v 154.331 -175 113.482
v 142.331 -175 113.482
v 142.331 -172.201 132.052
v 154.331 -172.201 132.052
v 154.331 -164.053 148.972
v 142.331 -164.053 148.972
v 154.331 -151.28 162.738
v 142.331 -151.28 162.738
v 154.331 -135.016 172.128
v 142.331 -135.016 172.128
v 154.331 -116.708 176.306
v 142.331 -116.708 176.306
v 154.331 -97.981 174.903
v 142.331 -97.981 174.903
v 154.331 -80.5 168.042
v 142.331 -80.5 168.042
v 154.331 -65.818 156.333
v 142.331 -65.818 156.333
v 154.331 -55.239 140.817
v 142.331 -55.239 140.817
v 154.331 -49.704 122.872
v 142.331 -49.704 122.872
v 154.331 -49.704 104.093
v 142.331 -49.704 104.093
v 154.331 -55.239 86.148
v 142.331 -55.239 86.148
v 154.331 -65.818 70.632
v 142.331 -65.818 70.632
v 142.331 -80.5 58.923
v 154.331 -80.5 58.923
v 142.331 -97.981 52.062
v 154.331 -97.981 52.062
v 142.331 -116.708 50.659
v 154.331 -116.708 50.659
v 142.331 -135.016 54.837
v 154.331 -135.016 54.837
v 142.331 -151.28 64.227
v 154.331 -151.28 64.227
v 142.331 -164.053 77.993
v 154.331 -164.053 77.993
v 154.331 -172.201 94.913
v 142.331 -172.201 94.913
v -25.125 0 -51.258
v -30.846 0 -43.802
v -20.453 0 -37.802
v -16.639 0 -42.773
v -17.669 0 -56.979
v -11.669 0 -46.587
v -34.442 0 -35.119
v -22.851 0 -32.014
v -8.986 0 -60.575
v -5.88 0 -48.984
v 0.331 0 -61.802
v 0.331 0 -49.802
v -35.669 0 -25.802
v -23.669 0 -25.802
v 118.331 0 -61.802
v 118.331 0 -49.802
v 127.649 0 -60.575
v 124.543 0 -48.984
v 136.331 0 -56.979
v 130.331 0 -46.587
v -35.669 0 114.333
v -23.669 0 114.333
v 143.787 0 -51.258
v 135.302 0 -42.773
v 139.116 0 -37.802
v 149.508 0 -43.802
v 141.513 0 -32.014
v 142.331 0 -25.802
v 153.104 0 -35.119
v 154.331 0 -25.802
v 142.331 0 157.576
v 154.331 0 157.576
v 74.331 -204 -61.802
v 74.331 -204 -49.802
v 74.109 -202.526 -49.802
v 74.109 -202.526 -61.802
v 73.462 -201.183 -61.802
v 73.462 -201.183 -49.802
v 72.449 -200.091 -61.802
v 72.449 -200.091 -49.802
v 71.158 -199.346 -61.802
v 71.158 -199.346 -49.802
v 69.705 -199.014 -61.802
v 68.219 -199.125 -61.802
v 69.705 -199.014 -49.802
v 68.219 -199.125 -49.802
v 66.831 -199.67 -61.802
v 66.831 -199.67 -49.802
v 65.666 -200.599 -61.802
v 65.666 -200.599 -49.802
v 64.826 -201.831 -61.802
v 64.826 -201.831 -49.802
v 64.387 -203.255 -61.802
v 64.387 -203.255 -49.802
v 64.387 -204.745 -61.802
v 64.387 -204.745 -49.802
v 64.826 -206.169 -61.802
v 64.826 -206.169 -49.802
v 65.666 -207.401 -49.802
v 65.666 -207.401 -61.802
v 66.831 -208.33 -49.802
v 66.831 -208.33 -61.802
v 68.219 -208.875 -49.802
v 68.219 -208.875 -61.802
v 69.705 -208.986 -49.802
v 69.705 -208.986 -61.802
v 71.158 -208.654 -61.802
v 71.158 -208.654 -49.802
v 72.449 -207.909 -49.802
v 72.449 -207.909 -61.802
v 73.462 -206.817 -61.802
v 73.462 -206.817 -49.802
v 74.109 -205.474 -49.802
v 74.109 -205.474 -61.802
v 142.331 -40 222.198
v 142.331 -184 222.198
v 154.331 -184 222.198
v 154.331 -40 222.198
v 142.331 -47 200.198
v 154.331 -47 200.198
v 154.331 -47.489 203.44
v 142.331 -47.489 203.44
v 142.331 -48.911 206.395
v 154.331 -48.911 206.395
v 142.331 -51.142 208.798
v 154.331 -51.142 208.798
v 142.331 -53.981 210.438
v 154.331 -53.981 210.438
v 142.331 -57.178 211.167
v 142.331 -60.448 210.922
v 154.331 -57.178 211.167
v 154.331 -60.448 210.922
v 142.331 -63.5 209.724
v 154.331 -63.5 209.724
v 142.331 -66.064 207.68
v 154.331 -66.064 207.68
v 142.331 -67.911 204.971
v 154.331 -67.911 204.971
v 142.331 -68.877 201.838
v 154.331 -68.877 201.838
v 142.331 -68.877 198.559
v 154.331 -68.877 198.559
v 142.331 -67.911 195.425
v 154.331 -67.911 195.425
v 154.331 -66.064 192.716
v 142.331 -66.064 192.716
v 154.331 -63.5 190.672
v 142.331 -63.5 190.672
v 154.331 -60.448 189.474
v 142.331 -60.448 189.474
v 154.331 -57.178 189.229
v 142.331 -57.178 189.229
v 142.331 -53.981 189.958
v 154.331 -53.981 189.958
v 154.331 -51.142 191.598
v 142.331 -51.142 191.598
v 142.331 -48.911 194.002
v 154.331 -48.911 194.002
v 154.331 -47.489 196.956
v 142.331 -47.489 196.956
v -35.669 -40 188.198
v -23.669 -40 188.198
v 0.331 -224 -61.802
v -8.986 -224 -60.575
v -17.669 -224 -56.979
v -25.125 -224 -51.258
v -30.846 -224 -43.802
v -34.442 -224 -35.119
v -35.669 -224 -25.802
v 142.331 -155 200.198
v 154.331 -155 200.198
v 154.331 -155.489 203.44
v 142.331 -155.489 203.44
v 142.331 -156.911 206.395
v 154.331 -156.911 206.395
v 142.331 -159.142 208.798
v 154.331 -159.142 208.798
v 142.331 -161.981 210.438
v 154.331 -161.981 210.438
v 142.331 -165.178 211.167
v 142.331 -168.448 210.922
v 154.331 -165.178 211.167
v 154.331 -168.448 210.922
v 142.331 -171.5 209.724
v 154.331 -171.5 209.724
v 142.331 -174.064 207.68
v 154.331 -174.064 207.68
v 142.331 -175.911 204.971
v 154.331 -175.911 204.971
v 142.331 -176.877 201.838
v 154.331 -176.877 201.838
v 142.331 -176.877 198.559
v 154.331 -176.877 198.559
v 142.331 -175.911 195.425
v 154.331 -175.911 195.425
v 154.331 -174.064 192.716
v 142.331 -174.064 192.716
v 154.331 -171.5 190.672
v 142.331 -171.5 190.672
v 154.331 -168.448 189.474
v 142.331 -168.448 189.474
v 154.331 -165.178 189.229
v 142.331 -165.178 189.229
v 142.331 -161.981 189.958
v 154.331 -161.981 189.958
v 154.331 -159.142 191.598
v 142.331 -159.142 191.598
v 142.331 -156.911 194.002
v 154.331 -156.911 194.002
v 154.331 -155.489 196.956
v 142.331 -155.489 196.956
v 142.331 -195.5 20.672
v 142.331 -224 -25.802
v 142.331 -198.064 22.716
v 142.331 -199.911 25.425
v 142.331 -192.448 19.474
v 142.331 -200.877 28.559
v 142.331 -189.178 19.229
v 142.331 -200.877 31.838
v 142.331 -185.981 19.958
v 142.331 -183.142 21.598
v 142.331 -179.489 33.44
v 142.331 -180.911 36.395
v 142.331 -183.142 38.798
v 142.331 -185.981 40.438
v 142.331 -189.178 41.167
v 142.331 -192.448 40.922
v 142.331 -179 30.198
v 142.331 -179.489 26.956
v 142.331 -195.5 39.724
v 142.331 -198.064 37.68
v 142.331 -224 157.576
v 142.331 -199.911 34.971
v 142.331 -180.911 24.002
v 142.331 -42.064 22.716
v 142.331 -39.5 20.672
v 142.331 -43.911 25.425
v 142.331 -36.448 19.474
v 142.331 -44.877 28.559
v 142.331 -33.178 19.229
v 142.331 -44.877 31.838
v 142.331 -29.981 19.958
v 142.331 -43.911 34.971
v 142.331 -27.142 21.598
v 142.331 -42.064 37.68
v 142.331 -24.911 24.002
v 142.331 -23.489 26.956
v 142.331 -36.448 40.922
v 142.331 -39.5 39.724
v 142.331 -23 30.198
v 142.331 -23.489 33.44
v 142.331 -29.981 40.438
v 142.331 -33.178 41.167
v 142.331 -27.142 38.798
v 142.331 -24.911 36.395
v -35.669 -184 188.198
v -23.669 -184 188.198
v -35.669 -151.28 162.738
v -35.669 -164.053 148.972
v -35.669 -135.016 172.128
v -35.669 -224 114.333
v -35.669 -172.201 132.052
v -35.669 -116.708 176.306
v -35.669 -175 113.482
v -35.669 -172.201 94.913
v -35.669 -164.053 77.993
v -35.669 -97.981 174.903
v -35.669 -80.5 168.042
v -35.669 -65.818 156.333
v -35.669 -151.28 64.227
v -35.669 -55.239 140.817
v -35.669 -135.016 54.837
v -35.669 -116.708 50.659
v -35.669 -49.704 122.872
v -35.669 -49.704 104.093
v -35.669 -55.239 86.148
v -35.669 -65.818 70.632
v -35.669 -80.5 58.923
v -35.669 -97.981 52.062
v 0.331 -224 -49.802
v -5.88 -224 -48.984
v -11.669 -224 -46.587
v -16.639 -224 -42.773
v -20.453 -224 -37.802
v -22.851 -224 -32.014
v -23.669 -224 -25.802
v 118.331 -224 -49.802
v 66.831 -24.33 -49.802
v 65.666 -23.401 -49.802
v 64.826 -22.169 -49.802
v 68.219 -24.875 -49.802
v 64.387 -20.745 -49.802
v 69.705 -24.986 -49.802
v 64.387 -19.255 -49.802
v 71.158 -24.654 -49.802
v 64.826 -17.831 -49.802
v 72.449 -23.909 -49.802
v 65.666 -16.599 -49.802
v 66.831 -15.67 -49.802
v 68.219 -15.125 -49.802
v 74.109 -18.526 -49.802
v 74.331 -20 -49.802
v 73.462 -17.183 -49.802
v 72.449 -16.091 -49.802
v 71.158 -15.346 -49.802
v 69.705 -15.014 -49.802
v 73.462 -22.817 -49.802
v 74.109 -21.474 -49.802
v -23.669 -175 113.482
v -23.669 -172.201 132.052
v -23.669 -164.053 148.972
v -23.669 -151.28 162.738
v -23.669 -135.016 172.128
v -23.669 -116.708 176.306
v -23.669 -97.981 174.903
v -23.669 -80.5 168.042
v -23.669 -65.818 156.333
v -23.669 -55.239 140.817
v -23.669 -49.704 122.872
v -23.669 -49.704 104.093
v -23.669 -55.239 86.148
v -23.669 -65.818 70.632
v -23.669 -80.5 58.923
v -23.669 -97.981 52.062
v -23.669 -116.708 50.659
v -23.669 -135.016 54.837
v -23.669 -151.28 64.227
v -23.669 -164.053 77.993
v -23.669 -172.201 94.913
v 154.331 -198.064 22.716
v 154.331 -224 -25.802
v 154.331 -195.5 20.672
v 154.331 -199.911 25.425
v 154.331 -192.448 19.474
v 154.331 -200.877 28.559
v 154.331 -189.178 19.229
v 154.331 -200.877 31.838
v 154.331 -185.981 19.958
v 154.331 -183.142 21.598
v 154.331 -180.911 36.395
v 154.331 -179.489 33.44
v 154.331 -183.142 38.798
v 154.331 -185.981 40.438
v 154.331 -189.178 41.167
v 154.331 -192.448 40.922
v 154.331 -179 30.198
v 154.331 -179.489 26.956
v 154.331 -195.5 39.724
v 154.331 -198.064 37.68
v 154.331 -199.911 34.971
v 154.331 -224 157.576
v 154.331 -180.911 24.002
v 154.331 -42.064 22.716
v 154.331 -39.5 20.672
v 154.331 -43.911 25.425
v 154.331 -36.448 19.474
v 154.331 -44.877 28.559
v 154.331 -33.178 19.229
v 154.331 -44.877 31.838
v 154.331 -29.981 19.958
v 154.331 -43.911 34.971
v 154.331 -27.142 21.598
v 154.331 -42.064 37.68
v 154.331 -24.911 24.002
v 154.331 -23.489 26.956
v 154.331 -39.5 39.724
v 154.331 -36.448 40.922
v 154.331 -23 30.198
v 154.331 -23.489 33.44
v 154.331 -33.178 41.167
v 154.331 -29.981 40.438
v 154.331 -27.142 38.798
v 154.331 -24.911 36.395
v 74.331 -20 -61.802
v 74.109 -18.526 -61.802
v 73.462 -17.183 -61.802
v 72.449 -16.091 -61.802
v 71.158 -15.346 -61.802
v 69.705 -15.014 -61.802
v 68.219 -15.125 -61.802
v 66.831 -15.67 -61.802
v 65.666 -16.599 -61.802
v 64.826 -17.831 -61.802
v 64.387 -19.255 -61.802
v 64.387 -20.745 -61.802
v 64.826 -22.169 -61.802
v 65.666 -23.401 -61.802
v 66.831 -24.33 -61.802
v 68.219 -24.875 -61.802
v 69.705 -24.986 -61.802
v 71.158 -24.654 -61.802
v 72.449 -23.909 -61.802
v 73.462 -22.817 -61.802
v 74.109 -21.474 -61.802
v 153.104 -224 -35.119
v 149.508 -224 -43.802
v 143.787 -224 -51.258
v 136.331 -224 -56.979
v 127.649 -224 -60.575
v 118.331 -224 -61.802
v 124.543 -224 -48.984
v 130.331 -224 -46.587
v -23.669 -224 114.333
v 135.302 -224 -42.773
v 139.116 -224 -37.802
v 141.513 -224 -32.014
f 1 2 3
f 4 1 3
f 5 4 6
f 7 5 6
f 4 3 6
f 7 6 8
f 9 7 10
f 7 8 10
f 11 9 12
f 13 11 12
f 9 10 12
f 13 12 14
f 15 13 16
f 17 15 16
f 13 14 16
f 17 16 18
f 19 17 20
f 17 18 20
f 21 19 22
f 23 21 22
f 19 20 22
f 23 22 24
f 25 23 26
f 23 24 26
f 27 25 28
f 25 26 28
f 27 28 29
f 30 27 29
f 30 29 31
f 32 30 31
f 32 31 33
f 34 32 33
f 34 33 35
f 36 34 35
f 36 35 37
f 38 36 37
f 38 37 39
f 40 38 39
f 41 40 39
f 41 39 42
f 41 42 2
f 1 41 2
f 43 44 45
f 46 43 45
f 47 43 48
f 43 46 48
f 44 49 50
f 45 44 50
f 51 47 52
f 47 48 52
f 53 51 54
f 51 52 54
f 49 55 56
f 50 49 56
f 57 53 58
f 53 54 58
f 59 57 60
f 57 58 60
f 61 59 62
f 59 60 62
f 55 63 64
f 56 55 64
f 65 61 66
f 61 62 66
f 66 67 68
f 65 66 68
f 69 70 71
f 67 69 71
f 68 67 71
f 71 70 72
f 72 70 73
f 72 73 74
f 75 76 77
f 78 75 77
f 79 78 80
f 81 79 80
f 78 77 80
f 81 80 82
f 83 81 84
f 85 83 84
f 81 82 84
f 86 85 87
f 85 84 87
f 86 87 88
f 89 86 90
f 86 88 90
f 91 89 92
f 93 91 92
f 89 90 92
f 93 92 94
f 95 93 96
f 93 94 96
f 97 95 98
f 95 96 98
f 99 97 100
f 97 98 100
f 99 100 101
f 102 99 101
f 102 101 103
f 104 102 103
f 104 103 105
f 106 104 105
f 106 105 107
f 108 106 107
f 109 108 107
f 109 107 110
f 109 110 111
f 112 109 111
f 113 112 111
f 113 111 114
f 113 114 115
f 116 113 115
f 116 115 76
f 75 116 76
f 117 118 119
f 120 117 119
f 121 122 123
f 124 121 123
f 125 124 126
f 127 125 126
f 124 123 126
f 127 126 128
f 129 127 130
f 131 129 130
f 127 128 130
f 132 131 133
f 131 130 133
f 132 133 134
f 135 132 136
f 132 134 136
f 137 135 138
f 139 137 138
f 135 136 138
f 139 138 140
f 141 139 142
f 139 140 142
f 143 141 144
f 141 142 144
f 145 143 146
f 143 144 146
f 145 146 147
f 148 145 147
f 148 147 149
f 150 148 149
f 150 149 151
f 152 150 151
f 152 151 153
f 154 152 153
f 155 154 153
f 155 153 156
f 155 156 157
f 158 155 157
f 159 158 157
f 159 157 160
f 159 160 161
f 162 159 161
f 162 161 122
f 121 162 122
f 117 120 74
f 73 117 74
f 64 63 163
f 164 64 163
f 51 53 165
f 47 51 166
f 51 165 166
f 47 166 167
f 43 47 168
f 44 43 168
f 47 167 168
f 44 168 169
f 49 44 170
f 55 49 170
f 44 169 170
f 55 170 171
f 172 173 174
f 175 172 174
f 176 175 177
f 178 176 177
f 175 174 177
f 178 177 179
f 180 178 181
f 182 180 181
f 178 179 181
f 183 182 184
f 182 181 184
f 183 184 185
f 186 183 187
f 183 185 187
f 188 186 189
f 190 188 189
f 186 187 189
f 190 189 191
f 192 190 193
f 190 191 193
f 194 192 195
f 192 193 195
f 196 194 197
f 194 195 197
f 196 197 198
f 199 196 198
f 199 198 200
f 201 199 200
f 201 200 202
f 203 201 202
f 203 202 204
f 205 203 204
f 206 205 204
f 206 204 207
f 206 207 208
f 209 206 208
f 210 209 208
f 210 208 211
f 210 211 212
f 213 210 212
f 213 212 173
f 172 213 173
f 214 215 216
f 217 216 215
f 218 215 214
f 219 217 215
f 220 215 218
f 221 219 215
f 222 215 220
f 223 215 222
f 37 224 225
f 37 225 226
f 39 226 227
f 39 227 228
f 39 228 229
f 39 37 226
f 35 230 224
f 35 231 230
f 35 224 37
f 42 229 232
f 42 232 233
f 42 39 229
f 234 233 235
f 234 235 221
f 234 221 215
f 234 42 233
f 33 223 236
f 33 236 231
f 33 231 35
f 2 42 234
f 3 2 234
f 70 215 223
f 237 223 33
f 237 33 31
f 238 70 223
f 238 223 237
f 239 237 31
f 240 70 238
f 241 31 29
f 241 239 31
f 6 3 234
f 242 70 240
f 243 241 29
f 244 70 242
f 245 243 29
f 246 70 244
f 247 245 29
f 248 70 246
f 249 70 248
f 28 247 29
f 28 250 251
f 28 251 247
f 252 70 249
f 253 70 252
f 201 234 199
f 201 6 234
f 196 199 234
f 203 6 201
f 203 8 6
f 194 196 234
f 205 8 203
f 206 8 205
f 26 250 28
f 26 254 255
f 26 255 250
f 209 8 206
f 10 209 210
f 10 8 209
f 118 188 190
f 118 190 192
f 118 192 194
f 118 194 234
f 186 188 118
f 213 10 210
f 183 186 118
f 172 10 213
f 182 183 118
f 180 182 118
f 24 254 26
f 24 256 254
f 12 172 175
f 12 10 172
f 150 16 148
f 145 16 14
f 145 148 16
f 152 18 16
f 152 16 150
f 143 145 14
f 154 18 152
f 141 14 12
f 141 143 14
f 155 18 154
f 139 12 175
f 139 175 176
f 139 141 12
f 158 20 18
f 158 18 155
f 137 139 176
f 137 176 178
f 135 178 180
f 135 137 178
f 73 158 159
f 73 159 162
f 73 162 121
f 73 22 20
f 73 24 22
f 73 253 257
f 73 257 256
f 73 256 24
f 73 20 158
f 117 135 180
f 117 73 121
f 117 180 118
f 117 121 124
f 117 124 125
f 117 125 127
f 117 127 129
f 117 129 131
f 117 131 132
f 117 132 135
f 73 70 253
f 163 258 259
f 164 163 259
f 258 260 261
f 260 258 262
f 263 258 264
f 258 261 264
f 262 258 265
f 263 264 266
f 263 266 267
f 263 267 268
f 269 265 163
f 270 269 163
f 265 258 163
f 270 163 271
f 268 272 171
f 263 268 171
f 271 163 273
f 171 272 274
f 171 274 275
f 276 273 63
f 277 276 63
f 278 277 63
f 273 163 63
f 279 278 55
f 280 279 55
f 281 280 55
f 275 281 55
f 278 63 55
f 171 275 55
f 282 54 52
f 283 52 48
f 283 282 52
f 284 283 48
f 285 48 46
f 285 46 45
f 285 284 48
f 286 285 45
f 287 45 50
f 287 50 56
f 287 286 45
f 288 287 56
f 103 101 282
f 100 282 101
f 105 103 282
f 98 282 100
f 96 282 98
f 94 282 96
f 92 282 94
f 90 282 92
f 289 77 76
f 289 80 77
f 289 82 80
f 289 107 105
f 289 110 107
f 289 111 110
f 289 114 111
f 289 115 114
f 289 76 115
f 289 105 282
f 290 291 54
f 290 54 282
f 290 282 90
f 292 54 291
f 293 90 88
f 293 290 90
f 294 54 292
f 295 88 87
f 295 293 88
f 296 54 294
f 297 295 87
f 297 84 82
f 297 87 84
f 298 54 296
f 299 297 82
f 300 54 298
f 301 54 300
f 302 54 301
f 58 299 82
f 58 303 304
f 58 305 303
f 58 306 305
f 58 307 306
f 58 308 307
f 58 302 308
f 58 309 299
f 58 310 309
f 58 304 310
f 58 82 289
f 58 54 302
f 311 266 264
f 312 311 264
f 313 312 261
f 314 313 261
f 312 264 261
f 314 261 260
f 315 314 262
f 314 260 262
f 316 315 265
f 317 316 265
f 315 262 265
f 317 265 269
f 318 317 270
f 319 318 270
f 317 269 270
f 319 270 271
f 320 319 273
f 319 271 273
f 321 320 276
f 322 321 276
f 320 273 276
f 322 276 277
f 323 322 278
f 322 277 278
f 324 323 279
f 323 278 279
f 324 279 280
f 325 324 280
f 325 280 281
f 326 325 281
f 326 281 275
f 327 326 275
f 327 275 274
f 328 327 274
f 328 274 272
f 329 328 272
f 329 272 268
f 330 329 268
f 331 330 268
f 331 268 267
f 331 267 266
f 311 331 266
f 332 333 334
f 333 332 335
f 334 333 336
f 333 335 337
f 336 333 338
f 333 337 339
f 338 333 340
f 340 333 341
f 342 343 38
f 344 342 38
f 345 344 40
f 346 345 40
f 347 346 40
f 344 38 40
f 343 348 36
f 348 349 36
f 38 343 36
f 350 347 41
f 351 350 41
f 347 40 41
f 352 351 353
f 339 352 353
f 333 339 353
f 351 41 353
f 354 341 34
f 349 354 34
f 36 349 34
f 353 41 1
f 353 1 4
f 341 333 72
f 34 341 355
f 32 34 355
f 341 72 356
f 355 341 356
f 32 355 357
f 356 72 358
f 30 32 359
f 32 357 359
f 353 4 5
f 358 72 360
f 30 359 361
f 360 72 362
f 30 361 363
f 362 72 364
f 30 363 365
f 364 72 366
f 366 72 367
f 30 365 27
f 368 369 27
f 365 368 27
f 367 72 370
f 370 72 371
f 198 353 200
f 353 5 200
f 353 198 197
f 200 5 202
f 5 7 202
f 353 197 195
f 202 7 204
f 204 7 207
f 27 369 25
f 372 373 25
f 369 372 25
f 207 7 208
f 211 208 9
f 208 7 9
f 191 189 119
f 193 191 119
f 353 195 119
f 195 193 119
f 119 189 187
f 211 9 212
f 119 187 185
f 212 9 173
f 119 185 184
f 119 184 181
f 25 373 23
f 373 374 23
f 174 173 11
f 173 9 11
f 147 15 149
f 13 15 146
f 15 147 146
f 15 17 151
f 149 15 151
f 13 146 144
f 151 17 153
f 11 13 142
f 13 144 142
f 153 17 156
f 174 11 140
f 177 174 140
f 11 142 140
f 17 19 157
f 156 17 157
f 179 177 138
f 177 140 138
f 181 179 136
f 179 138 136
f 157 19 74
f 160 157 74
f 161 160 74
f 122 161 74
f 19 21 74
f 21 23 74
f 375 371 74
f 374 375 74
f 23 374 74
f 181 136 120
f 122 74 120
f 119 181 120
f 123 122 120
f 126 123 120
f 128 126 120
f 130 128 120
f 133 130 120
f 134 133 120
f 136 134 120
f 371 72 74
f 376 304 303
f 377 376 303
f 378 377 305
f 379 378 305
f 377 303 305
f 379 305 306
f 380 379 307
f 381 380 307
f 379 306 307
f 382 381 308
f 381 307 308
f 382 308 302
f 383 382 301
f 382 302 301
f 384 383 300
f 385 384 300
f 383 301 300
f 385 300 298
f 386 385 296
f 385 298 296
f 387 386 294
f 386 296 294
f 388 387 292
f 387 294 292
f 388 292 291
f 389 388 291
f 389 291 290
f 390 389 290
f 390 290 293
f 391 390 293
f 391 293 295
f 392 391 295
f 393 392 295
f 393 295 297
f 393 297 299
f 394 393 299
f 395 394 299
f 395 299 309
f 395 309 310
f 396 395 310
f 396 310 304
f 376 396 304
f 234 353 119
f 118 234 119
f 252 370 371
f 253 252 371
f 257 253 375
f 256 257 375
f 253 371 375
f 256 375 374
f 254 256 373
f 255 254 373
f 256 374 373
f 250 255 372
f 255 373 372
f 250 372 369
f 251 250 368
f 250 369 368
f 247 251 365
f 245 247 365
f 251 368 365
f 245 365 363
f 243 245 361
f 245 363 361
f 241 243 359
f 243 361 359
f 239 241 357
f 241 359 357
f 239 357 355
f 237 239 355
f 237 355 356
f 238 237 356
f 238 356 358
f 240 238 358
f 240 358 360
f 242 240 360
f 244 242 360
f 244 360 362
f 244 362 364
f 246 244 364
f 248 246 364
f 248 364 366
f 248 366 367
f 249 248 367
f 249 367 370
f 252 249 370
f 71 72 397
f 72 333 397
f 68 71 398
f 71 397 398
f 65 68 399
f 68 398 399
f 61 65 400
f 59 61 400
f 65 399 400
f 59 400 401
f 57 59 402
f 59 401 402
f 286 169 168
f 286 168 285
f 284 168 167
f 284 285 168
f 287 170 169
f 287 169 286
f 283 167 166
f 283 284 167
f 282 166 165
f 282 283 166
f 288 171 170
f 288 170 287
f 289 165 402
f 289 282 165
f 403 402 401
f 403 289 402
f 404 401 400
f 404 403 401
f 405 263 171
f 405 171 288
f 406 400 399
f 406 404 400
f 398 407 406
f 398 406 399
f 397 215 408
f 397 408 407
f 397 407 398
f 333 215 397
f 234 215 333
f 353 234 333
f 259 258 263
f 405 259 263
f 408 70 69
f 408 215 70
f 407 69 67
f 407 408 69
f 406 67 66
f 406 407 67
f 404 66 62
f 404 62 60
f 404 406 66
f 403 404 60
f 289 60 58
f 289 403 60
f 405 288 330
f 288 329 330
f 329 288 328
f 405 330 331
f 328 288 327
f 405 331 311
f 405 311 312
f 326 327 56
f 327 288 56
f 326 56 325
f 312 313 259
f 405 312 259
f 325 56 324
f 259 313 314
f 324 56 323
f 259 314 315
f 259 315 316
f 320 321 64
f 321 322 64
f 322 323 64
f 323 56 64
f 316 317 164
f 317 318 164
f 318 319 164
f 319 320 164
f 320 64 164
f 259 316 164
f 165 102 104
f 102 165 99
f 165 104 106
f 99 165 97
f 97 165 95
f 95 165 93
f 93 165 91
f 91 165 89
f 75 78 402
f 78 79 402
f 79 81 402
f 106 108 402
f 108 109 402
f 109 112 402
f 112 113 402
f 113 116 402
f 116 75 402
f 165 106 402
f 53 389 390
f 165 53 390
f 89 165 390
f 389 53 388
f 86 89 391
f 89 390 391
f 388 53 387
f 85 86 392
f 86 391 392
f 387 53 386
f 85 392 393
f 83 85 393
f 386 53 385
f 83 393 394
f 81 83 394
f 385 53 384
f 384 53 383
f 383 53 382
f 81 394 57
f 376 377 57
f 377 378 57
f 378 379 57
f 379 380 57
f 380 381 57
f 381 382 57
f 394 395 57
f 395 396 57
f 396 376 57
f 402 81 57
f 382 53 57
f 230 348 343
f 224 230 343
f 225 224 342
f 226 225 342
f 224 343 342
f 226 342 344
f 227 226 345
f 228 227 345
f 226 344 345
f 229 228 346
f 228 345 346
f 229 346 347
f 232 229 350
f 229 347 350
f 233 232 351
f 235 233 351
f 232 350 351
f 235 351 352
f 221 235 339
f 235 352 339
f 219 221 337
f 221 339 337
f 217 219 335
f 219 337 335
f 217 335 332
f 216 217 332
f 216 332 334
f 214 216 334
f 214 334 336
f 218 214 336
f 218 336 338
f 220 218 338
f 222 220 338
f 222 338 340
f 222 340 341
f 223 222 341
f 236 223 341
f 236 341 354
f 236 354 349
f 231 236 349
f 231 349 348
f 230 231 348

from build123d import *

# Parameters (mm, degrees)
F0_W      = 12
F0_H      = 238
F0_H_2    = 12
F0_W_2    = 166
F0_H_3    = 272
F1_DEPTH  = 224
F2_R      = 24
F3_R      = 36
F5_DEPTH  = 12
F7_DEPTH  = 12
F8_R      = 63
F9_DEPTH  = 190
F10_R     = 11
F11_DEPTH = 25
F12_R     = 5
F13_DEPTH = 25


with BuildPart() as f1:
    # F0 (on Front) → F1 (new body)
    with BuildSketch(Plane.XZ):
        with Locations((-29.668833, 69.198049)):
            Rectangle(F0_W, F0_H)
        with Locations((-29.668833, -55.801951)):
            Rectangle(F0_W, F0_H_2)
        with Locations((59.331167, -55.801951)):
            Rectangle(F0_W_2, F0_H_2)
        with Locations((148.331167, 86.198049)):
            Rectangle(F0_W, F0_H_3)
        with Locations((148.331167, -55.801951)):
            Rectangle(F0_W, F0_H_2)
    extrude(amount=F1_DEPTH)

    # F2
    f2_edges = [f1.edges().sort_by_distance(p)[0] for p in [
        (-23.668833, -112, -49.801951),
        (142.331167, -112, -49.801951),
    ]]
    fillet(f2_edges, radius=F2_R)

    # F3
    f3_edges = [f1.edges().sort_by_distance(p)[0] for p in [
        (154.331167, -112, -61.801951),
        (-35.668833, -112, -61.801951),
    ]]
    fillet(f3_edges, radius=F3_R)

    # F4 (on face) → F5 (cut)
    with BuildSketch(Plane(origin=(-35.668833, 0, 0), x_dir=(0, -1, 0), z_dir=(-1, 0, 0))):
        Polygon((0, 114.333307), (40, 188.198049), (0, 188.198049), align=None)
        Polygon((224, 188.198049), (184, 188.198049), (224, 114.333307), align=None)
    extrude(amount=-F5_DEPTH, mode=Mode.SUBTRACT)

    # F6 (on face) → F7 (cut)
    with BuildSketch(Plane.YZ.offset(154.331167)):
        Polygon((-224, 222.198049), (-224, 157.576071), (-184, 222.198049), align=None)
        Polygon((0, 222.198049), (-40, 222.198049), (0, 157.576071), align=None)
    extrude(amount=-F7_DEPTH, mode=Mode.SUBTRACT)

    # F8 (on face) → F9 (cut)
    with BuildSketch(Plane(origin=(-35.668833, 0, 0), x_dir=(0, -1, 0), z_dir=(-1, 0, 0))):
        with Locations((112, 113.482498)):
            Circle(F8_R)
    extrude(amount=-F9_DEPTH, mode=Mode.SUBTRACT)

    # F10 (on face) → F11 (cut)
    with BuildSketch(Plane.YZ.offset(154.331167)):
        with Locations((-166, 200.198049)):
            Circle(F10_R)
        with Locations((-58, 200.198049)):
            Circle(F10_R)
        with Locations((-34, 30.198049)):
            Circle(F10_R)
        with Locations((-190, 30.198049)):
            Circle(F10_R)
    extrude(amount=-F11_DEPTH, mode=Mode.SUBTRACT)

    # F12 (on face) → F13 (cut)
    with BuildSketch(Plane.XY.offset(-49.801951)):
        with Locations((69.331167, -204)):
            Circle(F12_R)
        with Locations((69.331167, -20)):
            Circle(F12_R)
    extrude(amount=-F13_DEPTH, mode=Mode.SUBTRACT)


solid = f1.part
